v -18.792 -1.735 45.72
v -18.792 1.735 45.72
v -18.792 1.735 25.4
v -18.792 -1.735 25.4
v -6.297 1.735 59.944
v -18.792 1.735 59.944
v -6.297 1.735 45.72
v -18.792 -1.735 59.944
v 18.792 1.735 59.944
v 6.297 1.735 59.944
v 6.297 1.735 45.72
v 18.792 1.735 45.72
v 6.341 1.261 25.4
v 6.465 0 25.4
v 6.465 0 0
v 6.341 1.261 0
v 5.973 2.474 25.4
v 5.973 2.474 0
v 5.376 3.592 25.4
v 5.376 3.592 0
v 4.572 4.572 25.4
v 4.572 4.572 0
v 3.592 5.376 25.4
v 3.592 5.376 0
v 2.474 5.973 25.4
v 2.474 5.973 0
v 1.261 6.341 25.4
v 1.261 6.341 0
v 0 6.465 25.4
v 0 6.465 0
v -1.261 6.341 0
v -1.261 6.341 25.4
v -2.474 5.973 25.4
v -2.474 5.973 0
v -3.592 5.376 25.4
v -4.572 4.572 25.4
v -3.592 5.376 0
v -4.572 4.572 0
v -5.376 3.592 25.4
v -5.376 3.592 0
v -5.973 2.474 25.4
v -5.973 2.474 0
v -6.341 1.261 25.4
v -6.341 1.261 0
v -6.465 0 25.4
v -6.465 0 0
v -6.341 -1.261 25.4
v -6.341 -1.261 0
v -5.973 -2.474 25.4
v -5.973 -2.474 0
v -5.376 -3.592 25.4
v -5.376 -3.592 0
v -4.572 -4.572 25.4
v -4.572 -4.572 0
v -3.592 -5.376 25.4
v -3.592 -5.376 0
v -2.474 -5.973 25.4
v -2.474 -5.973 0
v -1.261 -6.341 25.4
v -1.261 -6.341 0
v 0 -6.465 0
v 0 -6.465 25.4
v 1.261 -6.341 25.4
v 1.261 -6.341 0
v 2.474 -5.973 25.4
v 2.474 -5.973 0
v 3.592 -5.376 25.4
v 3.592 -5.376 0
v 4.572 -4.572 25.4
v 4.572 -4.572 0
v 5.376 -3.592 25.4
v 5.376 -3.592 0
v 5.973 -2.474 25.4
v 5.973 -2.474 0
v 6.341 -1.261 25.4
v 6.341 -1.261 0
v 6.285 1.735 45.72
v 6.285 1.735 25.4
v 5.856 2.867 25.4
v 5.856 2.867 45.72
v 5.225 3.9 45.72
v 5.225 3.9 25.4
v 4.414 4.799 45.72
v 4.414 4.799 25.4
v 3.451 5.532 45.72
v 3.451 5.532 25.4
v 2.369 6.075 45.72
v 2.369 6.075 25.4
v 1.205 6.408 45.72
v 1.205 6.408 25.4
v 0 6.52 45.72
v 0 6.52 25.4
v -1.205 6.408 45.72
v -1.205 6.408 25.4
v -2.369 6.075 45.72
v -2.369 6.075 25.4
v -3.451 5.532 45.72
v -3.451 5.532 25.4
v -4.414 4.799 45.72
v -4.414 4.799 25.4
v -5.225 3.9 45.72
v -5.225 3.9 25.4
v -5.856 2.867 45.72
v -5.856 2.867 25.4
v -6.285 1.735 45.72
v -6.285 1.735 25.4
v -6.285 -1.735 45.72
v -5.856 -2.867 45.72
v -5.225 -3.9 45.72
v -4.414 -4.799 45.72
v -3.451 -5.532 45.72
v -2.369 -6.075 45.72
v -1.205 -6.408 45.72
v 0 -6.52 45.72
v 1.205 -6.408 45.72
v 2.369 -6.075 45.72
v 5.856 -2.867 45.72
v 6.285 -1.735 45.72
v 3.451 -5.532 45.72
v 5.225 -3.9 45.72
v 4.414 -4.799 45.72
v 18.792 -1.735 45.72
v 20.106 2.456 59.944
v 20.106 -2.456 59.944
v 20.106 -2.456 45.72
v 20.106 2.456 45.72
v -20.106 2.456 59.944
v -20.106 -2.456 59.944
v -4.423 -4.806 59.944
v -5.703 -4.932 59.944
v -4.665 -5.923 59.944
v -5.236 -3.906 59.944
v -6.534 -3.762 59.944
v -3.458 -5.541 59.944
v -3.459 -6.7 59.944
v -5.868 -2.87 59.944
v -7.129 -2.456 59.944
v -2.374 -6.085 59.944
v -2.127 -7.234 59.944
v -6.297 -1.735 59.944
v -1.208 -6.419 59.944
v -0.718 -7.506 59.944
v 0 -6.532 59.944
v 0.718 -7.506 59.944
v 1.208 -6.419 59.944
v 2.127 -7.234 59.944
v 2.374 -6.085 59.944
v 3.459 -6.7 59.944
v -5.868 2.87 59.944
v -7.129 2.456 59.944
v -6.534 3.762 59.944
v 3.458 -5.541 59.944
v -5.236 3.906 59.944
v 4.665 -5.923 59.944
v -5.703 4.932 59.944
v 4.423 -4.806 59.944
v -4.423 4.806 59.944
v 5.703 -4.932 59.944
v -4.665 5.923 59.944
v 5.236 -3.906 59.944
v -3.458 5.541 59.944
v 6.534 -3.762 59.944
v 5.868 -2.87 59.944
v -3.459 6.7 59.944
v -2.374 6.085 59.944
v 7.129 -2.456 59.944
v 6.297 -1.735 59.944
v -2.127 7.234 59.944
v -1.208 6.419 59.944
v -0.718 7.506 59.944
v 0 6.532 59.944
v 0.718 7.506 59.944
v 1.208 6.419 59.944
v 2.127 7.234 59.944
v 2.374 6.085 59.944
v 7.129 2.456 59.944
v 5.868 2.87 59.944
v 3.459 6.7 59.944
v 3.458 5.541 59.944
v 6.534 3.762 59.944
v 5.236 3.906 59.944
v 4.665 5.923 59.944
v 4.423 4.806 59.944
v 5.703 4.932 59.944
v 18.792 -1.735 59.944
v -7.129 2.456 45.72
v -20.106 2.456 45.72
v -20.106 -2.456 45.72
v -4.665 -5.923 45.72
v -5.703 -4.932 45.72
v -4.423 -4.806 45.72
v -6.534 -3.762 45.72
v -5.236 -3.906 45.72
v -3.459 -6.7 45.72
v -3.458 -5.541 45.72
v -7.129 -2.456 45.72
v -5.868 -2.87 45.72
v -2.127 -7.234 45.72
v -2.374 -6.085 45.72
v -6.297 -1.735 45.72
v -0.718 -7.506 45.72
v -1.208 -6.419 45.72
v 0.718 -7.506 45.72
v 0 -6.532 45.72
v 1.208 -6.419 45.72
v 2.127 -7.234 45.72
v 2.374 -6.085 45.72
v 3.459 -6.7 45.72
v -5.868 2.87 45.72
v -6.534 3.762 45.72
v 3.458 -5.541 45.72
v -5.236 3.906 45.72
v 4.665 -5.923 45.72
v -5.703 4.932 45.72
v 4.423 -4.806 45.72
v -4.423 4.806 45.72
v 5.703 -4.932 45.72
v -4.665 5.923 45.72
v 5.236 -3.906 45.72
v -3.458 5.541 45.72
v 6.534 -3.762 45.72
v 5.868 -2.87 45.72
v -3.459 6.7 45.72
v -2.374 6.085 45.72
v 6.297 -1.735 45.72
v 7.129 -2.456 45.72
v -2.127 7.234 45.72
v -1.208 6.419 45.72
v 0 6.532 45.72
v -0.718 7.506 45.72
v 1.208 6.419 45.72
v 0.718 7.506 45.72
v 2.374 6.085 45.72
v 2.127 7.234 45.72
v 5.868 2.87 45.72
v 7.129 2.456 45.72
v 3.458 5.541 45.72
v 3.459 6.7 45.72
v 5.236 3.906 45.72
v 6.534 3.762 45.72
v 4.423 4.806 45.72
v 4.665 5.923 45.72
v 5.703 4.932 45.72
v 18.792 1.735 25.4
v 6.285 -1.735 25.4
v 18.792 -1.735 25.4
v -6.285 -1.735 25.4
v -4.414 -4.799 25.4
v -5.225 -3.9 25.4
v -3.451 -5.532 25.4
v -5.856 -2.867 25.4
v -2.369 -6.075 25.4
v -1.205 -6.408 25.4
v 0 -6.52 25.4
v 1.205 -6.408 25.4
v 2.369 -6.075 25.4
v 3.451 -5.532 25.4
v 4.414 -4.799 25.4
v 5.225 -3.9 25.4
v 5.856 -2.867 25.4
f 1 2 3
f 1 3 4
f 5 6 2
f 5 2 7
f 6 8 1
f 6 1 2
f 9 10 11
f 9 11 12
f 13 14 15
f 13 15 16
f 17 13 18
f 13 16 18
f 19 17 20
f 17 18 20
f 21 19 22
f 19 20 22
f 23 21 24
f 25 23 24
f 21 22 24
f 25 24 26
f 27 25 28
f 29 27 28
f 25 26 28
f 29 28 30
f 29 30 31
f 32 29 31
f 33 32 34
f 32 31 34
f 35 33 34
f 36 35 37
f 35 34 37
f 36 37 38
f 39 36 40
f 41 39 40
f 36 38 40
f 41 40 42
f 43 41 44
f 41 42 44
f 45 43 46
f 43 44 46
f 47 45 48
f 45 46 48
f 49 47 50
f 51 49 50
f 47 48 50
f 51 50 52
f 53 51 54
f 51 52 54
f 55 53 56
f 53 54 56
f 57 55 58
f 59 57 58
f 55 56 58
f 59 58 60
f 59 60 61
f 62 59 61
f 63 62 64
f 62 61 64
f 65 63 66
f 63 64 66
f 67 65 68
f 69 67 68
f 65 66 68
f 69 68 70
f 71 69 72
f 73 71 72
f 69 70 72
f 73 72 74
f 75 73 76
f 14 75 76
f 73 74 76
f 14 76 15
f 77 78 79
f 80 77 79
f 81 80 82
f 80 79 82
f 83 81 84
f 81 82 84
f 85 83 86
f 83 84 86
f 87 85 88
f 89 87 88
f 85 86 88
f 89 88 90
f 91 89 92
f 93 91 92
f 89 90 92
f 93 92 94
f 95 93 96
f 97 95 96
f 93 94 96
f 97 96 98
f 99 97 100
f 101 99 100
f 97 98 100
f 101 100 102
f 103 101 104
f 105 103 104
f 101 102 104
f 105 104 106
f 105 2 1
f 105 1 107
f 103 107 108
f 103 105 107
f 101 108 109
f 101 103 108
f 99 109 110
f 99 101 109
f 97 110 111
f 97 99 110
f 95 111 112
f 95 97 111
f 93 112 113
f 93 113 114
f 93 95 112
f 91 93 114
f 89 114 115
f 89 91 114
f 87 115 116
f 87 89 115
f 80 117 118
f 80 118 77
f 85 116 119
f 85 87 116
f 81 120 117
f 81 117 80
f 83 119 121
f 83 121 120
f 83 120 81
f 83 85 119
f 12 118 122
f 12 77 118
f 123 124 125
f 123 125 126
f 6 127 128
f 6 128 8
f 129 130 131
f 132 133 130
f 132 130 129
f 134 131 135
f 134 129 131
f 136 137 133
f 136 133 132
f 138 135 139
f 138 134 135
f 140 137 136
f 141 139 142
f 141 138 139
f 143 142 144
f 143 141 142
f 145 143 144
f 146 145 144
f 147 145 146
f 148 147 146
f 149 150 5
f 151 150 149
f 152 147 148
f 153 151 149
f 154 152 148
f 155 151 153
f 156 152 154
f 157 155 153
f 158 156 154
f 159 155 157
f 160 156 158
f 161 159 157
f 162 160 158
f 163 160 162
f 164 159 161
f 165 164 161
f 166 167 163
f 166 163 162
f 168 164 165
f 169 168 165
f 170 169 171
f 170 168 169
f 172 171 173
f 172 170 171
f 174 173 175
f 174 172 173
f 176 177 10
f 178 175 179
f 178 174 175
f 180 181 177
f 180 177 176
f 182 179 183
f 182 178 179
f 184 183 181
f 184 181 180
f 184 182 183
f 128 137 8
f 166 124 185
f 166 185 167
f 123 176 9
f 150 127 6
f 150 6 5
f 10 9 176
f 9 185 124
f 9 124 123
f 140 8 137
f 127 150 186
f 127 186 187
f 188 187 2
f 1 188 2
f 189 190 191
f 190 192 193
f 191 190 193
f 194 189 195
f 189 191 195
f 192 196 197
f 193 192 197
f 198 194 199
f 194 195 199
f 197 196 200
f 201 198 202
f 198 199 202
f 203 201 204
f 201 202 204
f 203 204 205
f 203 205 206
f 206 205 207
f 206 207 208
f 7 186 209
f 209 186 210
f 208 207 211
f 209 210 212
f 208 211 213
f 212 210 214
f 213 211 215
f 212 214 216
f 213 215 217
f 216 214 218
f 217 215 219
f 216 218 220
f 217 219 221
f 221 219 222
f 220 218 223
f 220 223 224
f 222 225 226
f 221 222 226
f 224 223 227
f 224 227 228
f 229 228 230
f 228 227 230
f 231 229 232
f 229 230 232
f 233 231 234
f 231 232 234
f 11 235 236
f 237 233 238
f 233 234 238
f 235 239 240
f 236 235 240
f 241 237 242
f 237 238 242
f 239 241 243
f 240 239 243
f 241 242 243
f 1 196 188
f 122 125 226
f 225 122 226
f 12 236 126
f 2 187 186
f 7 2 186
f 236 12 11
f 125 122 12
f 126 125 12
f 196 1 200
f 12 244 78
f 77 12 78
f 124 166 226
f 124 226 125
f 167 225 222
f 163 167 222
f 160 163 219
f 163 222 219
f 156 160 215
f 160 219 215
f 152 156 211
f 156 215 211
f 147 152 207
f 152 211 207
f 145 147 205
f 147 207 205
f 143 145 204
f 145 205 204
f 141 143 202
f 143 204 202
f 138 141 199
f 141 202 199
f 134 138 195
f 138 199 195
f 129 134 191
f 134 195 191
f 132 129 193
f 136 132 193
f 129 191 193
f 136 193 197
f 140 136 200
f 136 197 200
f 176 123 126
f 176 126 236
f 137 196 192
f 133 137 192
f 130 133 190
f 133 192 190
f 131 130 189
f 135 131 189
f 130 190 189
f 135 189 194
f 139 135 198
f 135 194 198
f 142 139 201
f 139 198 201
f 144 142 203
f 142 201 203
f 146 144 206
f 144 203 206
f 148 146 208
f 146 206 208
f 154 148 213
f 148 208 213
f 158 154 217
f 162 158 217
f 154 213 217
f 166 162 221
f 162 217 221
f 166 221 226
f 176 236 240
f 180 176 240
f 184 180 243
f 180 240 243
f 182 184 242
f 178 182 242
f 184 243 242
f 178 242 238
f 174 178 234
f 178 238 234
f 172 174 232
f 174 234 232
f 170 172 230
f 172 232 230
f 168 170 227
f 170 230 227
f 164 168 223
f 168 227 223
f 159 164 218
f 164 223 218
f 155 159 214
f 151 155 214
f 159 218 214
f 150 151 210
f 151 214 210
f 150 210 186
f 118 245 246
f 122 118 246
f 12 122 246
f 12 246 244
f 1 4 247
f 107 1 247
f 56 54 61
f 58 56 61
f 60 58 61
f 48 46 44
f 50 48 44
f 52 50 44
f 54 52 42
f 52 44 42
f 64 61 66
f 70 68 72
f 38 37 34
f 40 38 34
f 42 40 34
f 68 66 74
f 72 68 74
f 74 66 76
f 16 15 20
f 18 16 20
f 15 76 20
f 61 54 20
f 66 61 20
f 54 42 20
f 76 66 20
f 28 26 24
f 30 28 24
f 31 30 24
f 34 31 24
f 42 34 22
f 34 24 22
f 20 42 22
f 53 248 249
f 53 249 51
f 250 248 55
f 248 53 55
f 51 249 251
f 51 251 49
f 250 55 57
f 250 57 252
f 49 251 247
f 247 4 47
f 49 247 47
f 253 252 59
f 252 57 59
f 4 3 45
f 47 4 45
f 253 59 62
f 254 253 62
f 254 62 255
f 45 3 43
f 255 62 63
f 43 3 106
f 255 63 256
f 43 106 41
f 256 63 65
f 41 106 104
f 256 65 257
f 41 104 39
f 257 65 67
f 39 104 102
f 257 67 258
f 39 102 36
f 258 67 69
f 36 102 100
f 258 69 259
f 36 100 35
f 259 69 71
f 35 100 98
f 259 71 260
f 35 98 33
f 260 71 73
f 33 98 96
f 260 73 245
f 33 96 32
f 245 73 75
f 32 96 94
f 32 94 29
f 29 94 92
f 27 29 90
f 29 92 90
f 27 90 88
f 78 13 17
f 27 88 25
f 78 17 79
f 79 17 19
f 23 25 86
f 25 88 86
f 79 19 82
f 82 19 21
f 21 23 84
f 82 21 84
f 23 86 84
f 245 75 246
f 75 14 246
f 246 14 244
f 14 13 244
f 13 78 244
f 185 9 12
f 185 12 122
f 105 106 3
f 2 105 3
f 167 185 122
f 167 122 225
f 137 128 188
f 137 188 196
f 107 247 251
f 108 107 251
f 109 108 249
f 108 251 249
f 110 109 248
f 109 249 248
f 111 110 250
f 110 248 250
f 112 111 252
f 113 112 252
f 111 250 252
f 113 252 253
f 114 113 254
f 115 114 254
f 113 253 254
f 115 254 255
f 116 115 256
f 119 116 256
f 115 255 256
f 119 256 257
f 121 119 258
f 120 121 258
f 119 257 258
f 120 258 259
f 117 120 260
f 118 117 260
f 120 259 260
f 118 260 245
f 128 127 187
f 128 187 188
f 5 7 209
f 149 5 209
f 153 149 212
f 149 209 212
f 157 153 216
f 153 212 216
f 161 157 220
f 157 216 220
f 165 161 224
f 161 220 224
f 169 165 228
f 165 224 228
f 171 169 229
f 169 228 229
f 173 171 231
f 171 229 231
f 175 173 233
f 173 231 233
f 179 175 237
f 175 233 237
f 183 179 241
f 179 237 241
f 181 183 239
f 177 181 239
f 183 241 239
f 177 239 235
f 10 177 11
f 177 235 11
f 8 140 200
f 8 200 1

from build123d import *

# Parameters (mm, degrees)
F0_R     = 6.4653345571
F1_DEPTH = 25.4
F3_DEPTH = 20.32
F5_DEPTH = 14.224


with BuildPart() as f1:
    # F0 (on Top) → F1 (new body)
    with BuildSketch(Plane.XY):
        Circle(F0_R)
    extrude(amount=F1_DEPTH)

    # F2 (on face) → F3 (join)
    with BuildSketch(Plane.XY.offset(25.4)):
        with BuildLine():
            Line((6.2849330107, -1.7354558222), (18.7918692827, -1.7354558222))
            Line((18.7918692827, -1.7354558222), (18.7918692827, 1.7354558222))
            Line((18.7918692827, 1.7354558222), (6.2849330107, 1.7354558222))
            ThreePointArc((6.2849330107, 1.7354558222), (6.4610686324, 0.8756608859), (6.5201372577, 0))
            ThreePointArc((6.5201372577, 0), (6.4610686324, -0.8756608859), (6.2849330107, -1.7354558222))
        make_face()
        with BuildLine():
            ThreePointArc((-6.2849330107, -1.7354558222), (0, -6.5201372577), (6.2849330107, -1.7354558222))
            Line((6.2849330107, -1.7354558222), (-6.2849330107, -1.7354558222))
        make_face()
        with BuildLine():
            Line((-6.2849330107, -1.7354558222), (6.2849330107, -1.7354558222))
            ThreePointArc((6.2849330107, -1.7354558222), (6.4610686324, -0.8756608859), (6.5201372577, 0))
            ThreePointArc((6.5201372577, 0), (6.4610686324, 0.8756608859), (6.2849330107, 1.7354558222))
            Line((6.2849330107, 1.7354558222), (-6.2849330107, 1.7354558222))
            ThreePointArc((-6.2849330107, 1.7354558222), (-6.5201372577, 0), (-6.2849330107, -1.7354558222))
        make_face()
        with BuildLine():
            Line((-18.7918692827, -1.7354558222), (-6.2849330107, -1.7354558222))
            ThreePointArc((-6.2849330107, -1.7354558222), (-6.5201372577, 0), (-6.2849330107, 1.7354558222))
            Line((-6.2849330107, 1.7354558222), (-18.7918692827, 1.7354558222))
            Line((-18.7918692827, 1.7354558222), (-18.7918692827, -1.7354558222))
        make_face()
        with BuildLine():
            Line((-6.2849330107, 1.7354558222), (6.2849330107, 1.7354558222))
            ThreePointArc((6.2849330107, 1.7354558222), (0, 6.5201372577), (-6.2849330107, 1.7354558222))
        make_face()
    extrude(amount=F3_DEPTH)


with BuildPart() as f5:
    # F4 (on face) → F5 (new body)
    with BuildSketch(Plane.XY.offset(45.72)):
        with BuildLine():
            Line((-20.1059710234, -2.4558792356), (-7.1285591408, -2.4558792356))
            ThreePointArc((-7.1285591408, -2.4558792356), (0, -7.5397412584), (7.1285591408, -2.4558792356))
            Line((7.1285591408, -2.4558792356), (20.1059710234, -2.4558792356))
            Line((20.1059710234, -2.4558792356), (20.1059710234, 2.4558792356))
            Line((20.1059710234, 2.4558792356), (7.1285591408, 2.4558792356))
            ThreePointArc((7.1285591408, 2.4558792356), (0, 7.5397412584), (-7.1285591408, 2.4558792356))
            Line((-7.1285591408, 2.4558792356), (-20.1059710234, 2.4558792356))
            Line((-20.1059710234, 2.4558792356), (-20.1059710234, -2.4558792356))
        make_face()
        with BuildLine():
            ThreePointArc((-6.2973014379, 1.7354558222), (0, 6.5320603419), (6.2973014379, 1.7354558222))
            Line((6.2973014379, 1.7354558222), (18.7918692827, 1.7354558222))
            Line((18.7918692827, 1.7354558222), (18.7918692827, -1.7354558222))
            Line((18.7918692827, -1.7354558222), (6.2973014379, -1.7354558222))
            ThreePointArc((6.2973014379, -1.7354558222), (0, -6.5320603419), (-6.2973014379, -1.7354558222))
            Line((-6.2973014379, -1.7354558222), (-18.7918692827, -1.7354558222))
            Line((-18.7918692827, -1.7354558222), (-18.7918692827, 1.7354558222))
            Line((-18.7918692827, 1.7354558222), (-6.2973014379, 1.7354558222))
        make_face(mode=Mode.SUBTRACT)
    extrude(amount=F5_DEPTH)


solid = Compound([f1.part, f5.part])
